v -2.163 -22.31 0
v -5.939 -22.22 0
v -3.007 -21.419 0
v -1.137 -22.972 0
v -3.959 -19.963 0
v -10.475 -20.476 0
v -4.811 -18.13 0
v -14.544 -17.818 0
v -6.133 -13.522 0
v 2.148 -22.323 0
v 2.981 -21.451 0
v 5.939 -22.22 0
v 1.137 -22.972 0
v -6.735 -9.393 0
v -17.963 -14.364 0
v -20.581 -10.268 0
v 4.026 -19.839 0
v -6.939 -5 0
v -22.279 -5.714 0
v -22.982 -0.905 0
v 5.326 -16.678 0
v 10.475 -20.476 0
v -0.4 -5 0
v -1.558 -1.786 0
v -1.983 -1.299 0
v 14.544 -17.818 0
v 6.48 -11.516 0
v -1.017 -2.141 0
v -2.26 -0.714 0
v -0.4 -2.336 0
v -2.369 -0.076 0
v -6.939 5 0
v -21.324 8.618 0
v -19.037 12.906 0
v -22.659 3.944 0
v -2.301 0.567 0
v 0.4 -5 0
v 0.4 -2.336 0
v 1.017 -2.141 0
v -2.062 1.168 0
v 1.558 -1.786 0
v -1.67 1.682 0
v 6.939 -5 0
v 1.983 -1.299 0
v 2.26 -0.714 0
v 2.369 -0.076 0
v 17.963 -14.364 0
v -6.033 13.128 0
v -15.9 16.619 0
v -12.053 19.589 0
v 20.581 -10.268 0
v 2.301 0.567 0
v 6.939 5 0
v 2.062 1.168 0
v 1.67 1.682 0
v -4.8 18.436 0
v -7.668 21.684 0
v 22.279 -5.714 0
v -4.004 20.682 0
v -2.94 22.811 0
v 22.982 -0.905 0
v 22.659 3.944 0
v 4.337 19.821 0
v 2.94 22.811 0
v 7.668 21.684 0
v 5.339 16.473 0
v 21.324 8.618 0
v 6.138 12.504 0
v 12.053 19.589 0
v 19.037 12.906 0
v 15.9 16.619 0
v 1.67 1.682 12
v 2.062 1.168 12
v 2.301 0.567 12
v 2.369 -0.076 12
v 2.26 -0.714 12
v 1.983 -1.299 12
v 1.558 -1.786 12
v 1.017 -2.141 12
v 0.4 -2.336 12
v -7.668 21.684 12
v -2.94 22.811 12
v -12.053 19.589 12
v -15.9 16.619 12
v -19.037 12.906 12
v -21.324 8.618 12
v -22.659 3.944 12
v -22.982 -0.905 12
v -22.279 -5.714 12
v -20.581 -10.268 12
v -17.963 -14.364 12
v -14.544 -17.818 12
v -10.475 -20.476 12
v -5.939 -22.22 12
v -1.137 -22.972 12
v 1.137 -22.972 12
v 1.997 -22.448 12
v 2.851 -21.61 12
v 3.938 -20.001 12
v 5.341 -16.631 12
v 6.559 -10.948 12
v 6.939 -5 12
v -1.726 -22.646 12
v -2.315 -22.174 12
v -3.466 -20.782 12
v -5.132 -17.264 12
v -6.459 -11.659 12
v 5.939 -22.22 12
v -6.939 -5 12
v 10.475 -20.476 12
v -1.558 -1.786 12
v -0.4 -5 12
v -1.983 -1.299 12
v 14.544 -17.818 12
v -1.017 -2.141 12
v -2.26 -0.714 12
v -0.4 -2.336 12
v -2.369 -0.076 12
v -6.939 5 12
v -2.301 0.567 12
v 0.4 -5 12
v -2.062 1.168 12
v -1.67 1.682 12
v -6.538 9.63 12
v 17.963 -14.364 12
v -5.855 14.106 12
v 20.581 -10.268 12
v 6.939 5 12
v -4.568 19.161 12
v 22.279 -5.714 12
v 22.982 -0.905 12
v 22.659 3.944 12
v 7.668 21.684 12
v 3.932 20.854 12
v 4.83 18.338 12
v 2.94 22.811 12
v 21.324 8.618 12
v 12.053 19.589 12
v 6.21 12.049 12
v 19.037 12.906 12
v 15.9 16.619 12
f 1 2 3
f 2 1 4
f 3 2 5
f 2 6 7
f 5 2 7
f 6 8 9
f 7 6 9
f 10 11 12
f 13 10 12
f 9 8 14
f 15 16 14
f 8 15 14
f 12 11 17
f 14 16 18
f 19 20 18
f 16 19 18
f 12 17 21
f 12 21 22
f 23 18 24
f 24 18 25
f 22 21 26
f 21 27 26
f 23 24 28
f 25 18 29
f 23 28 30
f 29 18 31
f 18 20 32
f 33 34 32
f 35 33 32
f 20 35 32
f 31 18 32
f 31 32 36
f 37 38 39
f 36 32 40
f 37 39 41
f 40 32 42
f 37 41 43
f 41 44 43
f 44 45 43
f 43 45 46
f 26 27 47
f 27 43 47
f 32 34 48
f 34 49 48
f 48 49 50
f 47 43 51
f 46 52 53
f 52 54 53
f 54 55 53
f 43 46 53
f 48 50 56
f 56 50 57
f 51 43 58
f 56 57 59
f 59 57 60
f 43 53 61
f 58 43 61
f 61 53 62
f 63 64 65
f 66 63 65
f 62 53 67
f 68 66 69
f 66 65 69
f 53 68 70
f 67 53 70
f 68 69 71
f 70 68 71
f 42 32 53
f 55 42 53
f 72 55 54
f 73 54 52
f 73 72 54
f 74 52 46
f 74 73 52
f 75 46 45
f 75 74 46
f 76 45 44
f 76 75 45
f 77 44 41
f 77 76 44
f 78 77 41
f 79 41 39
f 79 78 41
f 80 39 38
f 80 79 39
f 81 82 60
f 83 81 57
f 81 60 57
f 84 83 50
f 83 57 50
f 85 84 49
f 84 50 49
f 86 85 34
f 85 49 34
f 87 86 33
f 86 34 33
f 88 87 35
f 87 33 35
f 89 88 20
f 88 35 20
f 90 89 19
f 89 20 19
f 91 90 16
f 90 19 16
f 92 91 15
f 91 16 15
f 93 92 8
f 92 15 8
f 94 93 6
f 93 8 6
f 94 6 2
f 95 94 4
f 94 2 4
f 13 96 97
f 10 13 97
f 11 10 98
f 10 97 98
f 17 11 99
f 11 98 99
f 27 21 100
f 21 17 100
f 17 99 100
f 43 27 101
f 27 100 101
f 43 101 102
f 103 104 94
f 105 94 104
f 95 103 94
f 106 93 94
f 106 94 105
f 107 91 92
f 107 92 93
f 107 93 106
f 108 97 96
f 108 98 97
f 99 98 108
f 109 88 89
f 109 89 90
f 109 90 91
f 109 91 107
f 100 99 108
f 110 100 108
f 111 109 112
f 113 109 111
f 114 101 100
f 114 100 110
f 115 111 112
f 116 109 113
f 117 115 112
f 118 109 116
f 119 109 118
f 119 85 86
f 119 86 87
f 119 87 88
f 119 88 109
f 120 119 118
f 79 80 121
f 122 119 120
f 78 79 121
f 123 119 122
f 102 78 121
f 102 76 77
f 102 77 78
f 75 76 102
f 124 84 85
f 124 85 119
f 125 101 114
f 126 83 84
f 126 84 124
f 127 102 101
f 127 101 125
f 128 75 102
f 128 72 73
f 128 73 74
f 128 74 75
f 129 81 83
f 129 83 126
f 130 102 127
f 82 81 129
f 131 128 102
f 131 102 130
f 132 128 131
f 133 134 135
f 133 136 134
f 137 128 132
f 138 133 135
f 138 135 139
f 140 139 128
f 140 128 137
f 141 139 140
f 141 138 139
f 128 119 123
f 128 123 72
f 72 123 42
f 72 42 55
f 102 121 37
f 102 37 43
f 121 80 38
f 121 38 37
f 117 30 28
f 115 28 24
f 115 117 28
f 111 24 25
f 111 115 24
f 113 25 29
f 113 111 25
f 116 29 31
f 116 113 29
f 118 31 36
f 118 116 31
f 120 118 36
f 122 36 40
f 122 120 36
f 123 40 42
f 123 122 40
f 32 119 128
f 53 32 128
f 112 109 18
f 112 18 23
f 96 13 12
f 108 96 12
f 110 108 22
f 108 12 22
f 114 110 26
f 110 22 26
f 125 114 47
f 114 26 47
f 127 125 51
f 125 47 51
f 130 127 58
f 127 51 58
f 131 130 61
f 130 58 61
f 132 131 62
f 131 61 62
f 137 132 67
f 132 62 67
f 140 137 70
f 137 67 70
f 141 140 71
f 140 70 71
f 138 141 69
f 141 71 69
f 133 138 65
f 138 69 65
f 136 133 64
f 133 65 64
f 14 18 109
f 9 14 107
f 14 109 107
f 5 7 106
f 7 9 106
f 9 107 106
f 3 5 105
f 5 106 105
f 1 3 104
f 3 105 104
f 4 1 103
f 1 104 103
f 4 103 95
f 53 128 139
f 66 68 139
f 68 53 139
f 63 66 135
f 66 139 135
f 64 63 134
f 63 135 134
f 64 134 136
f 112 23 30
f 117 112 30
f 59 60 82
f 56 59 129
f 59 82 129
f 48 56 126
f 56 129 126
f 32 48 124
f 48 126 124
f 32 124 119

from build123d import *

# Parameters (mm, degrees)
SKETCH1_R           = 23
BOSS_EXTRUDE1_DEPTH = 12
CUT_EXTRUDE1_DEPTH  = 13


with BuildPart() as part:
    # Sketch1 → Boss-Extrude1 (new body)
    with BuildSketch(Plane.XY):
        Circle(SKETCH1_R)
    extrude(amount=BOSS_EXTRUDE1_DEPTH)

    # Sketch2 → Cut-Extrude1 (cut, through all)
    with BuildSketch(Plane.XY.offset(12)):
        with BuildLine():
            Line((-1.669663439, 1.682), (1.669663439, 1.682))
            ThreePointArc((1.669663439, 1.682), (2.259858272, -0.714101248), (0.4, -2.336000856))
            Line((0.4, -2.336000856), (0.4, -5))
            Line((0.4, -5), (6.939400576, -5))
            add(Edge.make_bspline(
                [(-6.939400576, -5), (-6.939400576, -23.218031299), (0, -23.218031299), (6.939400576, -23.218031299), (6.939400576, -5)],
                knots=[1.570796327, 1.570796327, 1.570796327, 3.141592654, 3.141592654, 4.71238898, 4.71238898, 4.71238898], degree=2, weights=[1, 0.707106781, 1, 0.707106781, 1]))
            Line((-6.939400576, -5), (-0.4, -5))
            Line((-0.4, -5), (-0.4, -2.336000856))
            ThreePointArc((-0.4, -2.336000856), (-2.259858272, -0.714101248), (-1.669663439, 1.682))
        make_face()
        with BuildLine():
            Line((-6.939400576, 5), (6.939400576, 5))
            add(Edge.make_bspline(
                [(6.939400576, 5), (5.785687162, 25.074195607), (0, 25.074195607), (-5.785687162, 25.074195607), (-6.939400576, 5)],
                knots=[4.913142926, 4.913142926, 4.913142926, 6.283185307, 6.283185307, 7.653227688, 7.653227688, 7.653227688], degree=2, weights=[1, 0.77440564, 1, 0.77440564, 1]))
        make_face()
    extrude(amount=-CUT_EXTRUDE1_DEPTH, mode=Mode.SUBTRACT)


solid = part.part
